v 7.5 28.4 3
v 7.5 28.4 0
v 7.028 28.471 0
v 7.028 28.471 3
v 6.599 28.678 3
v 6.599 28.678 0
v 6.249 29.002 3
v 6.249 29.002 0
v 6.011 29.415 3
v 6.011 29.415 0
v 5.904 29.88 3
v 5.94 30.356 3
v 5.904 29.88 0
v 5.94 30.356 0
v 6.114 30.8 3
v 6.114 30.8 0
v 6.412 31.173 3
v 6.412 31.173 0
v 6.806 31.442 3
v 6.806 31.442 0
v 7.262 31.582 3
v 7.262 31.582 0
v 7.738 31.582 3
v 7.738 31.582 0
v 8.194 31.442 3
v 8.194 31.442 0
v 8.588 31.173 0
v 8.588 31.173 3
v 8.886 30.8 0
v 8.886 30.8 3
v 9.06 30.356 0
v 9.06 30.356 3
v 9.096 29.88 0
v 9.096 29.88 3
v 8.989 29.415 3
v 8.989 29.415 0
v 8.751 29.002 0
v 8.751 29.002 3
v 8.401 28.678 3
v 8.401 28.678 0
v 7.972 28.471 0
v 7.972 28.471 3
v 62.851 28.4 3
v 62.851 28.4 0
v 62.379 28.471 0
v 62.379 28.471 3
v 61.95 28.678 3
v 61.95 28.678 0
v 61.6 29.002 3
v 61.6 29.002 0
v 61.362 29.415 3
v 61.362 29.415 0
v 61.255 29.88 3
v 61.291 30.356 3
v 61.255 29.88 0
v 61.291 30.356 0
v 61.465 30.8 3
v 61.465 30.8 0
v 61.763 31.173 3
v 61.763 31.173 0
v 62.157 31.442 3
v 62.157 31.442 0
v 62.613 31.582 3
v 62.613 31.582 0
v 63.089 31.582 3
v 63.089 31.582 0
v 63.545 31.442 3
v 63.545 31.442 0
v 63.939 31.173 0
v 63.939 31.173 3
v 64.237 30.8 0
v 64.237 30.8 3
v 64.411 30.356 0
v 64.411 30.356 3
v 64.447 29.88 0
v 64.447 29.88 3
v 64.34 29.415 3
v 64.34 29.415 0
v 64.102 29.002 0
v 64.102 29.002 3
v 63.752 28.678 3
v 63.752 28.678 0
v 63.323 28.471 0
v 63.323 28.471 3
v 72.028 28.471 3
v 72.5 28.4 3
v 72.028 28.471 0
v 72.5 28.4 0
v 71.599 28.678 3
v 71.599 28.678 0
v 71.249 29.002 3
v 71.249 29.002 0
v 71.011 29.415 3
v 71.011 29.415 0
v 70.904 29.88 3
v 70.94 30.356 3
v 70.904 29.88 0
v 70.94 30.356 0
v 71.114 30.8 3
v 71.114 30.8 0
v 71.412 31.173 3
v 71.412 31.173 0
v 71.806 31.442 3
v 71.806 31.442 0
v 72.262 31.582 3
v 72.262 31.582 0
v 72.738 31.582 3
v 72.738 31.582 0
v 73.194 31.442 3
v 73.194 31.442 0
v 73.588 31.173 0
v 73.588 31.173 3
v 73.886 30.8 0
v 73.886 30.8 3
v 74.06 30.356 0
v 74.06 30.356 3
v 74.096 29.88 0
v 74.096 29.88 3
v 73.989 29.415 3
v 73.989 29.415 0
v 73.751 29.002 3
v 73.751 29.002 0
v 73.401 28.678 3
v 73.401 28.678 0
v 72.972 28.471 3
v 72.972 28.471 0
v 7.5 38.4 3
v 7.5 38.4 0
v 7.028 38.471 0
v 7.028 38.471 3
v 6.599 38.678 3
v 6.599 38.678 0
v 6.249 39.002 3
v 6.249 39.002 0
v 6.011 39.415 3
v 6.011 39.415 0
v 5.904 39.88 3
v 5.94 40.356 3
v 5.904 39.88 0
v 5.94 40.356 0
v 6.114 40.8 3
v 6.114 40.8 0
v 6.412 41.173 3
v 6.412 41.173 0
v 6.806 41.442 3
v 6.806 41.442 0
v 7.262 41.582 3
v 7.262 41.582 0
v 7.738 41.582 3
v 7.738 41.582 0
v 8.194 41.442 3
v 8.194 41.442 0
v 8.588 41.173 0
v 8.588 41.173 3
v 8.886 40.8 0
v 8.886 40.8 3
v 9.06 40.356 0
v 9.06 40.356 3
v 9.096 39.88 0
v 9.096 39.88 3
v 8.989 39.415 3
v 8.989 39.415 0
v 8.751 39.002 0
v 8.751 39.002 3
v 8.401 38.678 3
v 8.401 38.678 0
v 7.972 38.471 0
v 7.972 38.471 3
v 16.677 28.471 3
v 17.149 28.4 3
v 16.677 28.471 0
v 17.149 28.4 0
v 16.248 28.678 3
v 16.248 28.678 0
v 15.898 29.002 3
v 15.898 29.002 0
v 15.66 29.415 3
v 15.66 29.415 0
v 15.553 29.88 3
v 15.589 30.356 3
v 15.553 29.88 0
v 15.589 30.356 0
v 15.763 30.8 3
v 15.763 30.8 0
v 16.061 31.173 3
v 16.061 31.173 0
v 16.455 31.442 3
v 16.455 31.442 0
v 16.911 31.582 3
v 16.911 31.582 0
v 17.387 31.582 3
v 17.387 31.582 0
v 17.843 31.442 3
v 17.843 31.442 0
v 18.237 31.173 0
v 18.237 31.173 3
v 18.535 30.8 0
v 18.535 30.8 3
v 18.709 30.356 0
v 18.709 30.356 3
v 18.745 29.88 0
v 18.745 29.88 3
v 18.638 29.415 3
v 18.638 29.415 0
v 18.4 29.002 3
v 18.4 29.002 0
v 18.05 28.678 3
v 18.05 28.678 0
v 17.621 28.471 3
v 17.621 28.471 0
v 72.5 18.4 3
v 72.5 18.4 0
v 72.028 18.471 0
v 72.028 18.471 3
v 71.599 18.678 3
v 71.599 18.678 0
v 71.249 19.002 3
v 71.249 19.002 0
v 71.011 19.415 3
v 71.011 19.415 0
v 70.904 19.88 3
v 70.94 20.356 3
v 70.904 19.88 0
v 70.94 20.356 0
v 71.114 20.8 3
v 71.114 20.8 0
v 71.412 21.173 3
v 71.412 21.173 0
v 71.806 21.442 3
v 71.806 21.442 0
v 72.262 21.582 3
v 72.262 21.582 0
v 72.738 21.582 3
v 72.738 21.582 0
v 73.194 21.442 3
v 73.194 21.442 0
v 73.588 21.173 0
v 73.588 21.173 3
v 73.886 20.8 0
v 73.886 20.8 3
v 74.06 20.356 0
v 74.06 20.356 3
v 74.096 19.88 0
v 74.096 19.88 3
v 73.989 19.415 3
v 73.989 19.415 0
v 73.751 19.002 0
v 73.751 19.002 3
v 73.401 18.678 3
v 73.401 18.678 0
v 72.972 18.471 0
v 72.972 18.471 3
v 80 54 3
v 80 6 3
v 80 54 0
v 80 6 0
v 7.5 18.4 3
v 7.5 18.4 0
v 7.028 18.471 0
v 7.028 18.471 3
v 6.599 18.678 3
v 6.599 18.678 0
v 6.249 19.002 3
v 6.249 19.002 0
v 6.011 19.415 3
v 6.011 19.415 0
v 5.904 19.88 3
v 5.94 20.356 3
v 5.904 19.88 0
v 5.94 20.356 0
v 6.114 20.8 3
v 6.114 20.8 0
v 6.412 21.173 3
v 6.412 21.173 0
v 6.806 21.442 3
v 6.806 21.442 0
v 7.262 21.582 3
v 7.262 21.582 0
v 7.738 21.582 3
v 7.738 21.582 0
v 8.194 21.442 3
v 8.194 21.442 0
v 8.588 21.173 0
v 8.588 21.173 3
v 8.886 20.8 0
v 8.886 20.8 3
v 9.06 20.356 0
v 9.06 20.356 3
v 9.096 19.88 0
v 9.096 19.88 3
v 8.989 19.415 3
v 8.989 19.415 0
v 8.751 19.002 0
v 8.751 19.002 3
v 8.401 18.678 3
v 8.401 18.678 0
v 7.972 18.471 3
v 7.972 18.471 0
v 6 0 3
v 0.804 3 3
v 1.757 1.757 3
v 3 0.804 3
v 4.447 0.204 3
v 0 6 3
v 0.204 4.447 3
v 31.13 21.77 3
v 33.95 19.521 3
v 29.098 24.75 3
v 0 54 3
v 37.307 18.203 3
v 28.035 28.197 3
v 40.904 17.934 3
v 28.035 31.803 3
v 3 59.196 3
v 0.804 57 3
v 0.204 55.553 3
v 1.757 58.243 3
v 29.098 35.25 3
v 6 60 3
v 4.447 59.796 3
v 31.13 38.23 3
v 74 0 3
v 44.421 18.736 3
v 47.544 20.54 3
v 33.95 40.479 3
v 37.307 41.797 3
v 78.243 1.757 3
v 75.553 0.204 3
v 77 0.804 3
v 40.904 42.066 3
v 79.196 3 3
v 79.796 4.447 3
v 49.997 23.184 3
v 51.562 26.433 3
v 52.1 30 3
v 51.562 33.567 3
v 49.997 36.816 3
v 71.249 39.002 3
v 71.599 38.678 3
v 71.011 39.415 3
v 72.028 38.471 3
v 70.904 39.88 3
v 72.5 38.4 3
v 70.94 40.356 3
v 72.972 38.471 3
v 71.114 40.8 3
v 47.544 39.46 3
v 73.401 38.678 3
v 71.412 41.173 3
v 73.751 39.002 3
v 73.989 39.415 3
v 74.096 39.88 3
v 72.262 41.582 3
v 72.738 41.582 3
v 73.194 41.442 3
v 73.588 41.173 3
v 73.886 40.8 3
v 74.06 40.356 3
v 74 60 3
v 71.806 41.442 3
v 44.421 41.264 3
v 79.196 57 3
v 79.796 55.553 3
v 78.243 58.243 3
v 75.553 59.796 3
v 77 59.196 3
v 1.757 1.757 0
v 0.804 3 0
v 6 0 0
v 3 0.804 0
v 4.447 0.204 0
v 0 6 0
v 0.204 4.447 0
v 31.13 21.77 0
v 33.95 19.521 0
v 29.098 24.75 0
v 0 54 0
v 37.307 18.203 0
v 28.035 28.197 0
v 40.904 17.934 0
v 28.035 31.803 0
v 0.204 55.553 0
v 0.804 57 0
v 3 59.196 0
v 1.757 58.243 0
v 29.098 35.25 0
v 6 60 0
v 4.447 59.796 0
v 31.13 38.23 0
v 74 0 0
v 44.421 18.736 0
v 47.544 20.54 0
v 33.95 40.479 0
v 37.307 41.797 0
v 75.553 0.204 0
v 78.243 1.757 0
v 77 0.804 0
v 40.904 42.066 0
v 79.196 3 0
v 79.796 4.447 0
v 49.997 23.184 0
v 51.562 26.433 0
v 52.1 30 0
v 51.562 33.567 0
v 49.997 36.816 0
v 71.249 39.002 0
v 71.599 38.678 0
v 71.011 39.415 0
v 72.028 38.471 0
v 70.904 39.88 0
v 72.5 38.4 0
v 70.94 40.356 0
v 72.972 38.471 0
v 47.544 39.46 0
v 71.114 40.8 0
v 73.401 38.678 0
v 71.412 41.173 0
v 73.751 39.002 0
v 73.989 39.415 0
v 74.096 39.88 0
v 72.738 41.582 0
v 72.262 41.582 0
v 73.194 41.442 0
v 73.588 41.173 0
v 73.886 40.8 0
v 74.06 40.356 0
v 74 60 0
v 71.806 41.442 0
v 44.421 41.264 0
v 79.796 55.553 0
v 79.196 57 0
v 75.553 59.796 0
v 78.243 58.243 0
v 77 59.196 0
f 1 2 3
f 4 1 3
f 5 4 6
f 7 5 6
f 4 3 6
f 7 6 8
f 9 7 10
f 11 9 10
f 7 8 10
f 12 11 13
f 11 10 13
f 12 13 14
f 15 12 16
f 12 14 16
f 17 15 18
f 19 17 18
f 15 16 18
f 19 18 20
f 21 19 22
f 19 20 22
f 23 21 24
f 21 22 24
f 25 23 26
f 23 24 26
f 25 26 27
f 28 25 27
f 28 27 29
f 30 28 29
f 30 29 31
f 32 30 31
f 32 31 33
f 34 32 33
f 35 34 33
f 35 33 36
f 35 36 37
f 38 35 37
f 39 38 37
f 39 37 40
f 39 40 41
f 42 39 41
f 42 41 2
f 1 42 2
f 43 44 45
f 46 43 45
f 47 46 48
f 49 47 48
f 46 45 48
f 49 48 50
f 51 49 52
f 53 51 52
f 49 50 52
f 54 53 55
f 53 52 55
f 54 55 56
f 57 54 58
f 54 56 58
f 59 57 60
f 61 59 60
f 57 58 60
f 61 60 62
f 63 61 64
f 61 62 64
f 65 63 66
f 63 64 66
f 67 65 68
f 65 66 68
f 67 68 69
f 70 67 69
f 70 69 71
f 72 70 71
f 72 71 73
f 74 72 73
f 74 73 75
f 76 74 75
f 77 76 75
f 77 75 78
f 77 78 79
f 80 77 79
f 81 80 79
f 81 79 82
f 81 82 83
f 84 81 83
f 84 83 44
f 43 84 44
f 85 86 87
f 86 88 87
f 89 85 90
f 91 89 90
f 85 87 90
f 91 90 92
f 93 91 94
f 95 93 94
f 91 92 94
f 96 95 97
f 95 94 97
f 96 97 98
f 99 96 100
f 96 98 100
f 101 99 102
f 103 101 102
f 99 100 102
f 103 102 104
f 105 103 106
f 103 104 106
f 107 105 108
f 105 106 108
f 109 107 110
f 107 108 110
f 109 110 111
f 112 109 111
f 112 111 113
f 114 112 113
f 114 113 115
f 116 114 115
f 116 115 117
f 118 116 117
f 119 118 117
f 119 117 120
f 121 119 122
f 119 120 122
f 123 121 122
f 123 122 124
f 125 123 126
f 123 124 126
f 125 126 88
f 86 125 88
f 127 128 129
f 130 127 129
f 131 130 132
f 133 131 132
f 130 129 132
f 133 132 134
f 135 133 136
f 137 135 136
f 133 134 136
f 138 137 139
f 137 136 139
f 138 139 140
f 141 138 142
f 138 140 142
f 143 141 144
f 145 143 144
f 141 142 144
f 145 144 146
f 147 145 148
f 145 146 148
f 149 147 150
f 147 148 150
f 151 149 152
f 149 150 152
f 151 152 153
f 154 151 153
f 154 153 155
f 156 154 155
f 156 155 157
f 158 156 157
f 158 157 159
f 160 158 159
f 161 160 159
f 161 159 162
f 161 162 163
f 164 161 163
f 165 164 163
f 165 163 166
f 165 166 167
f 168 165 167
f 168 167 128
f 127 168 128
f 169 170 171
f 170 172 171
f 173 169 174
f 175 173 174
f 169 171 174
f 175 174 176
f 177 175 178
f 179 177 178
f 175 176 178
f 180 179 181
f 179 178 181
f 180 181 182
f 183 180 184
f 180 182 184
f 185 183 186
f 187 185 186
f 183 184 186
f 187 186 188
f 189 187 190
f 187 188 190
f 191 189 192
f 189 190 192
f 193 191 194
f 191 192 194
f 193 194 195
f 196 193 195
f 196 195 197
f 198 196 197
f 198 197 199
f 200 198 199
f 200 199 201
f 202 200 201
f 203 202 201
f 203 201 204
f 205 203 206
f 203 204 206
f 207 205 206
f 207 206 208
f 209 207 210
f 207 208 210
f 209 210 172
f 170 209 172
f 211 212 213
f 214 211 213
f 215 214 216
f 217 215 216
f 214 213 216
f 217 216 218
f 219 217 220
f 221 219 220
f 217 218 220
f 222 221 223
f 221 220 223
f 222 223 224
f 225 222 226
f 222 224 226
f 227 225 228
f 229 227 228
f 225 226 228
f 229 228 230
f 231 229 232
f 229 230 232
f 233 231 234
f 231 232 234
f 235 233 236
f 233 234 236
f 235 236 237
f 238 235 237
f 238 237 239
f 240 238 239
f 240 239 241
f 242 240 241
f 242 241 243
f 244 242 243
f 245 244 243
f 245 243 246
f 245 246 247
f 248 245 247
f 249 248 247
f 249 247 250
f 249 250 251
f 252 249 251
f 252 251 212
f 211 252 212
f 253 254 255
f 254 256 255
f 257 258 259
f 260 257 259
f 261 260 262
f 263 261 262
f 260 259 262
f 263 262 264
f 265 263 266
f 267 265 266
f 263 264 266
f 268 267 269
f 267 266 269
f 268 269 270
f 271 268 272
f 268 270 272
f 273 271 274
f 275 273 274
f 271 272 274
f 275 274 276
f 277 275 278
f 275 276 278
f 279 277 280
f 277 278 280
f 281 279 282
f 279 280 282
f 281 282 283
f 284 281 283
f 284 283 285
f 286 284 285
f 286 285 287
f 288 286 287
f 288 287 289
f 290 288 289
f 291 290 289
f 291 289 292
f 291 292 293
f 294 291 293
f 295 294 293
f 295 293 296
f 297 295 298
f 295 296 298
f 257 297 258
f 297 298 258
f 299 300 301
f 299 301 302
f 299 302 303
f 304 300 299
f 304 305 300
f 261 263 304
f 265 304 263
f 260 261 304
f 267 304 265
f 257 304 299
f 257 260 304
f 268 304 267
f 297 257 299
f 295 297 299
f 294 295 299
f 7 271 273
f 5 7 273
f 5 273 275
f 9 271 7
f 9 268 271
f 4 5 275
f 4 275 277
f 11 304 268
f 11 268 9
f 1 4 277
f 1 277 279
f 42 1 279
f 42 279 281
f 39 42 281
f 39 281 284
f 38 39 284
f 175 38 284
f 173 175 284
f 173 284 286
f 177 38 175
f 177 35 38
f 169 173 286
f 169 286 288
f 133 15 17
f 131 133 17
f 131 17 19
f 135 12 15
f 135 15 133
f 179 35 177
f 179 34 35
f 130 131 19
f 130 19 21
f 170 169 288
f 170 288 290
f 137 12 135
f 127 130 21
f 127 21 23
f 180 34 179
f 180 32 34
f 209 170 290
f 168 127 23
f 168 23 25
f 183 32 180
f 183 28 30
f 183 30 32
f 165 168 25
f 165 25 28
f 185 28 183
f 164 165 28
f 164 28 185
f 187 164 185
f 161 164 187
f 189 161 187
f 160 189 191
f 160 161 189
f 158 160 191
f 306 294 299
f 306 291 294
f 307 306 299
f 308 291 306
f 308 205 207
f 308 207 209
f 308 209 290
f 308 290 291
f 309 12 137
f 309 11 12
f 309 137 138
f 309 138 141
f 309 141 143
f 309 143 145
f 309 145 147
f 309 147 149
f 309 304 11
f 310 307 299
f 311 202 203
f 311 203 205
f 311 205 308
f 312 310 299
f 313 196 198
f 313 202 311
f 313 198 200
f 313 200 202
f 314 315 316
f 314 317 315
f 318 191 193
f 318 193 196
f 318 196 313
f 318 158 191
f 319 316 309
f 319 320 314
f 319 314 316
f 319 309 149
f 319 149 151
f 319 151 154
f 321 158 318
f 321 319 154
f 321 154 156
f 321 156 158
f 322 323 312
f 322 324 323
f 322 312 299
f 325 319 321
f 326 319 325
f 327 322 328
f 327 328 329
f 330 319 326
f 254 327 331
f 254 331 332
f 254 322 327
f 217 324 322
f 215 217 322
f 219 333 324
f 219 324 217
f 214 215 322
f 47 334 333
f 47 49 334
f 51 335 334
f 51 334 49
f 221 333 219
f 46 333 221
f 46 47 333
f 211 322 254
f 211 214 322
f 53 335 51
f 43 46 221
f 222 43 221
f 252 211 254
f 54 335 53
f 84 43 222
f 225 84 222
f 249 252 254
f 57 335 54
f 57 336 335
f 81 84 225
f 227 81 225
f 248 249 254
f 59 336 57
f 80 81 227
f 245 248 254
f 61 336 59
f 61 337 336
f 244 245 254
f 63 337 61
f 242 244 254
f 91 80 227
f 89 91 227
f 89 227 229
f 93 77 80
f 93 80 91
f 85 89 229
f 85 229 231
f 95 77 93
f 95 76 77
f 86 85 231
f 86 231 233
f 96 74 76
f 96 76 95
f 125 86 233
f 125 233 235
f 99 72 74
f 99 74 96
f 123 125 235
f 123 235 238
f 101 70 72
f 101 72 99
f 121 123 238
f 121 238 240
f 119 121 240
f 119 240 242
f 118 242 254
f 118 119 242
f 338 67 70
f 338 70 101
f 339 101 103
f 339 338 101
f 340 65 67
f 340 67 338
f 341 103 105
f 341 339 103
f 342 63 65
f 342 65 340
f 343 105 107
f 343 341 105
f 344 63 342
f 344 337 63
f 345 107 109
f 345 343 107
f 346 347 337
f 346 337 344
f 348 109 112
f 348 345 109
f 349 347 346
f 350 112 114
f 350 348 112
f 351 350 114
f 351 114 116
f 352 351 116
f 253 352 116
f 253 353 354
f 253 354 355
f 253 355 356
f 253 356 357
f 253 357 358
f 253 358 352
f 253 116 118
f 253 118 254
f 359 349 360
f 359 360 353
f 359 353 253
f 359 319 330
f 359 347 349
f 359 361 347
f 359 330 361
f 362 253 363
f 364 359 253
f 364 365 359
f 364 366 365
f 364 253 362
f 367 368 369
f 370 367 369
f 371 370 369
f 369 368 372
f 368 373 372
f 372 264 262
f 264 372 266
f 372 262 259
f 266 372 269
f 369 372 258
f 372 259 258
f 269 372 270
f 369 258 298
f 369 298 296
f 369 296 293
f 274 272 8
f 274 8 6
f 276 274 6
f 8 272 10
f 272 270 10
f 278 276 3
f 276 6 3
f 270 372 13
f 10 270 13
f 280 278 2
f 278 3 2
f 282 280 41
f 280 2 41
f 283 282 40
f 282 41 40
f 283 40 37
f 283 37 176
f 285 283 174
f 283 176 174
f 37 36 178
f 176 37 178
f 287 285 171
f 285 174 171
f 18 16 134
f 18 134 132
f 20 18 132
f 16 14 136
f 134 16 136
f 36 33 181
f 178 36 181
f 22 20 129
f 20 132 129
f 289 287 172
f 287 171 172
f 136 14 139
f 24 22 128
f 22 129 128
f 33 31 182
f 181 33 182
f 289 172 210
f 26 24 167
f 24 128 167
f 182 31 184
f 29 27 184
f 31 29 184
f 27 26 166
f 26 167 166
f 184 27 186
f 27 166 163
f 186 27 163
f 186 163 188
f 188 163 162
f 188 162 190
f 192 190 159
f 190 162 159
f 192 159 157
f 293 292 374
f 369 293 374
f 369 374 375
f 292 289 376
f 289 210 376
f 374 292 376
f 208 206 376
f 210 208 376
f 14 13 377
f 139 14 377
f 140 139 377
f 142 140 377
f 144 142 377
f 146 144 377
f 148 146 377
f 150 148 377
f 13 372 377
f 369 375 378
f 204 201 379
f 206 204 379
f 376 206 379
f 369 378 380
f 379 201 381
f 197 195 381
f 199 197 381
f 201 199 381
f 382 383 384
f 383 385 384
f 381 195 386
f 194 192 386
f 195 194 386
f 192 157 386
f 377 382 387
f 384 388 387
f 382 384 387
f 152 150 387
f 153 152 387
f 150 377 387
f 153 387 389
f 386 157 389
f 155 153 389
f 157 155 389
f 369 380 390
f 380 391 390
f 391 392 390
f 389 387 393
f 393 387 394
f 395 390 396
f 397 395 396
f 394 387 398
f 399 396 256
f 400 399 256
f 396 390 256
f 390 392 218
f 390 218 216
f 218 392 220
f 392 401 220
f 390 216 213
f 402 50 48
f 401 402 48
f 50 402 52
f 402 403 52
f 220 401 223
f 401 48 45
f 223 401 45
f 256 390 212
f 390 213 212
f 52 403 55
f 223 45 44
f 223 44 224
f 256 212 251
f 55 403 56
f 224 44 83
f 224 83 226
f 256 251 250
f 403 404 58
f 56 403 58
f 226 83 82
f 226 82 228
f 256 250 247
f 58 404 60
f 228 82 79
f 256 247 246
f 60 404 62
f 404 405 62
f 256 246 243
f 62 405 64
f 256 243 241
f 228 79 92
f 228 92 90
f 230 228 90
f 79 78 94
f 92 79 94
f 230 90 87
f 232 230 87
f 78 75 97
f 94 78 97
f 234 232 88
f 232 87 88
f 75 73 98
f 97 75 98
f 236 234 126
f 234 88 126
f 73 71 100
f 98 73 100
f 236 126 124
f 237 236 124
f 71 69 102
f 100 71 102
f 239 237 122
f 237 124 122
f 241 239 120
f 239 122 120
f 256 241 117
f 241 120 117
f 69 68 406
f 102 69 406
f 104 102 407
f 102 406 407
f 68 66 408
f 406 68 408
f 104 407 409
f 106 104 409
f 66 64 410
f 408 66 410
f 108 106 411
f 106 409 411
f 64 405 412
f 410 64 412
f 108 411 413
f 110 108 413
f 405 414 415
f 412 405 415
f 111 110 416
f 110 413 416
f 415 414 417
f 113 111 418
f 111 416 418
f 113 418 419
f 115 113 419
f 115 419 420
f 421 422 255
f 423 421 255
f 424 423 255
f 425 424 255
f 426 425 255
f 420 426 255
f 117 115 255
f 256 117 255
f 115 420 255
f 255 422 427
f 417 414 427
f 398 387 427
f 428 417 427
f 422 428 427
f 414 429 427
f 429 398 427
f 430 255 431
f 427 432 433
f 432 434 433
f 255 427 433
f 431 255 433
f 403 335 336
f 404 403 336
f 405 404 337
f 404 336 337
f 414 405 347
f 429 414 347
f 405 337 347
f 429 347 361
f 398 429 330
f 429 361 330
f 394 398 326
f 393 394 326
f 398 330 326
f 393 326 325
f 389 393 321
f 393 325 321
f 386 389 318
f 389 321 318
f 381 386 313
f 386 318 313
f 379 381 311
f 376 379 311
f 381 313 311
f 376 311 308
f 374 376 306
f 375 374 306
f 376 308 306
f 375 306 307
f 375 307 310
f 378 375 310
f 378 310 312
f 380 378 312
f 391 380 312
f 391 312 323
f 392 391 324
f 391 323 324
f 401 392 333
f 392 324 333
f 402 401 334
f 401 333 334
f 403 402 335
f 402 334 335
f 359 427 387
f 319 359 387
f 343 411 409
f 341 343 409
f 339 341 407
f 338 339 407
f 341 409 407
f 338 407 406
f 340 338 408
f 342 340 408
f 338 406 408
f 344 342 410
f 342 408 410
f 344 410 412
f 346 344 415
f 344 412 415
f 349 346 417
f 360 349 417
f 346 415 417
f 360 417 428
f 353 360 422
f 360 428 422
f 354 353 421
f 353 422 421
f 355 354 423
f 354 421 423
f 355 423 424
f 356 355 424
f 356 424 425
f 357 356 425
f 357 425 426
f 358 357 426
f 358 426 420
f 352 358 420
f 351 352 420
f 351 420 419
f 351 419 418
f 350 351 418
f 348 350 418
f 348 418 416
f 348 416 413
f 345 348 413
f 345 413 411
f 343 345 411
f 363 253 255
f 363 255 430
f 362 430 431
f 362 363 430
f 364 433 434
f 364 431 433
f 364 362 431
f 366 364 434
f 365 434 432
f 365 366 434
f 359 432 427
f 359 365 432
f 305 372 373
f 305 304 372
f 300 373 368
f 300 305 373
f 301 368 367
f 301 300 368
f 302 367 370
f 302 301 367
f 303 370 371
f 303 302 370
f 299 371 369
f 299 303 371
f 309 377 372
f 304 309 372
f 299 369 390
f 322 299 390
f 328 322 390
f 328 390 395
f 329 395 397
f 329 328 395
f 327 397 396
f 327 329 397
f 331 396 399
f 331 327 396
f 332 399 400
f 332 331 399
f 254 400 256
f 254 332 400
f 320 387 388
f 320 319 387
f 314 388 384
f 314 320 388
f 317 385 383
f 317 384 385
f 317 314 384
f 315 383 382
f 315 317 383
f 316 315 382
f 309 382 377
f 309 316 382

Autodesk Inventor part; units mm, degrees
ref_plane "YZ Plane" through (0, 0, 0) normal (1, 0, 0) x (0, 1, 0)
ref_plane "XZ Plane" through (0, 0, 0) normal (0, 1, 0) x (-1, 0, 0)
ref_plane "XY Plane" through (0, 0, 0) normal (0, 0, 1) x (1, 0, 0)
sketch "スケッチ1" plane through (0, 0, 0) normal (0, 0, 1) x (1, 0, 0)
  line L0 (0, 0) -> (80, 0)
  line L1 (80, 0) -> (80, 60)
  line L2 (80, 60) -> (0, 60)
  line L3 (0, 60) -> (0, 0)
  dimension "d0" = 80
  dimension "d1" = 60
extrude "押し出し1" add sketch "スケッチ1" along normal blind 3
sketch "スケッチ2" plane through (0, 0, 3) normal (0, 0, 1) x (1, 0, 0)
  point P0 (0, 0)
sketch "スケッチ3" plane through (0, 0, 3) normal (0, 0, 1) x (1, 0, 0)
  line L0 (0, 0) -> (80, 0) projected
  line L1 (15, 0) -> (15, 60) construction
  line L2 (15, 0) -> (75, 0) construction
  line L3 (0, 60) -> (0, 0) projected
  circle A0 centre (7.5, 30) radius 1.6
  circle A1 centre (7.5, 40) radius 1.6
  circle A2 centre (7.5, 20) radius 1.6
  line L4 (80, 60) -> (0, 60) projected
  line L5 (40, 60) -> (40, 0) construction
  circle A3 centre (72.5, 30) radius 1.6
  circle A4 centre (72.5, 40) radius 1.6
  circle A5 centre (72.5, 20) radius 1.6
  point P0 (0, 30)
  dimension "d4" = 60
  dimension "d5" = 90
  dimension "d6" = 15
  dimension "d7" = 3.2
  dimension "d8" = 7.5
  dimension "d9" = 30
  dimension "d10" = 3.2
  dimension "d11" = 3.2
  dimension "d12" = 10
  dimension "d13" = 10
  dimension "d14" = 40
hole "穴1" at (7.5, 40, 3) at (7.5, 30, 3) at (7.5, 20, 3) at (72.5, 40, 3) at (72.5, 30, 3) at (72.5, 20, 3) direction (0, 0, -1) diameter 3.2 end through all
sketch "スケッチ4" plane through (0, 0, 3) normal (0, 0, 1) x (1, 0, 0)
  circle A0 centre (40, 30) radius 7.5
  line L0 (80, 60) -> (0, 60) projected
  line L1 (80, 0) -> (80, 60) projected
  point P0 (0, 0)
  dimension "d22" = 15
  dimension "d23" = 30
  dimension "d24" = 40
extrude "押し出し2" cut sketch "スケッチ4" against normal blind 3
sketch "スケッチ5" plane through (0, 0, 3) normal (0, 0, 1) x (1, 0, 0)
  point P0 (0, 0)
sketch "スケッチ6" plane through (0, 0, 3) normal (0, 0, 1) x (1, 0, 0)
  circle A0 centre (40, 30) radius 7.5 projected
  circle A1 centre (40, 30) radius 12.1
  point P0 (0, 0)
  dimension "d27" = 24.2
extrude "押し出し3" cut sketch "スケッチ6" against normal blind 3
sketch "スケッチ7" plane through (0, 0, 3) normal (0, 0, 1) x (1, 0, 0)
  circle A0 centre (40, 30) radius 12.1 projected
  line L0 (0, 0) -> (80, 0) projected
  point P0 (62.851, 30)
  point P1 (17.149, 30)
  dimension "d30" = 22.851
  dimension "d31" = 22.851
  dimension "d32" = 30
  dimension "d33" = 30
hole "穴2" at (17.149, 30, 3) at (62.851, 30, 3) direction (0, 0, -1) diameter 3.2 end through all
fillet "フィレット1" radius 6 4 edges at (0, 60, 1.5) (80, 60, 1.5) (80, 0, 1.5) (0, 0, 1.5)
sketch "スケッチ8" plane through (0, 0, 3) normal (0, 0, 1) x (1, 0, 0)
  point P0 (0, 0)
properties part number "射出_エンコーダー固定" material "アルミニウム 6061"
